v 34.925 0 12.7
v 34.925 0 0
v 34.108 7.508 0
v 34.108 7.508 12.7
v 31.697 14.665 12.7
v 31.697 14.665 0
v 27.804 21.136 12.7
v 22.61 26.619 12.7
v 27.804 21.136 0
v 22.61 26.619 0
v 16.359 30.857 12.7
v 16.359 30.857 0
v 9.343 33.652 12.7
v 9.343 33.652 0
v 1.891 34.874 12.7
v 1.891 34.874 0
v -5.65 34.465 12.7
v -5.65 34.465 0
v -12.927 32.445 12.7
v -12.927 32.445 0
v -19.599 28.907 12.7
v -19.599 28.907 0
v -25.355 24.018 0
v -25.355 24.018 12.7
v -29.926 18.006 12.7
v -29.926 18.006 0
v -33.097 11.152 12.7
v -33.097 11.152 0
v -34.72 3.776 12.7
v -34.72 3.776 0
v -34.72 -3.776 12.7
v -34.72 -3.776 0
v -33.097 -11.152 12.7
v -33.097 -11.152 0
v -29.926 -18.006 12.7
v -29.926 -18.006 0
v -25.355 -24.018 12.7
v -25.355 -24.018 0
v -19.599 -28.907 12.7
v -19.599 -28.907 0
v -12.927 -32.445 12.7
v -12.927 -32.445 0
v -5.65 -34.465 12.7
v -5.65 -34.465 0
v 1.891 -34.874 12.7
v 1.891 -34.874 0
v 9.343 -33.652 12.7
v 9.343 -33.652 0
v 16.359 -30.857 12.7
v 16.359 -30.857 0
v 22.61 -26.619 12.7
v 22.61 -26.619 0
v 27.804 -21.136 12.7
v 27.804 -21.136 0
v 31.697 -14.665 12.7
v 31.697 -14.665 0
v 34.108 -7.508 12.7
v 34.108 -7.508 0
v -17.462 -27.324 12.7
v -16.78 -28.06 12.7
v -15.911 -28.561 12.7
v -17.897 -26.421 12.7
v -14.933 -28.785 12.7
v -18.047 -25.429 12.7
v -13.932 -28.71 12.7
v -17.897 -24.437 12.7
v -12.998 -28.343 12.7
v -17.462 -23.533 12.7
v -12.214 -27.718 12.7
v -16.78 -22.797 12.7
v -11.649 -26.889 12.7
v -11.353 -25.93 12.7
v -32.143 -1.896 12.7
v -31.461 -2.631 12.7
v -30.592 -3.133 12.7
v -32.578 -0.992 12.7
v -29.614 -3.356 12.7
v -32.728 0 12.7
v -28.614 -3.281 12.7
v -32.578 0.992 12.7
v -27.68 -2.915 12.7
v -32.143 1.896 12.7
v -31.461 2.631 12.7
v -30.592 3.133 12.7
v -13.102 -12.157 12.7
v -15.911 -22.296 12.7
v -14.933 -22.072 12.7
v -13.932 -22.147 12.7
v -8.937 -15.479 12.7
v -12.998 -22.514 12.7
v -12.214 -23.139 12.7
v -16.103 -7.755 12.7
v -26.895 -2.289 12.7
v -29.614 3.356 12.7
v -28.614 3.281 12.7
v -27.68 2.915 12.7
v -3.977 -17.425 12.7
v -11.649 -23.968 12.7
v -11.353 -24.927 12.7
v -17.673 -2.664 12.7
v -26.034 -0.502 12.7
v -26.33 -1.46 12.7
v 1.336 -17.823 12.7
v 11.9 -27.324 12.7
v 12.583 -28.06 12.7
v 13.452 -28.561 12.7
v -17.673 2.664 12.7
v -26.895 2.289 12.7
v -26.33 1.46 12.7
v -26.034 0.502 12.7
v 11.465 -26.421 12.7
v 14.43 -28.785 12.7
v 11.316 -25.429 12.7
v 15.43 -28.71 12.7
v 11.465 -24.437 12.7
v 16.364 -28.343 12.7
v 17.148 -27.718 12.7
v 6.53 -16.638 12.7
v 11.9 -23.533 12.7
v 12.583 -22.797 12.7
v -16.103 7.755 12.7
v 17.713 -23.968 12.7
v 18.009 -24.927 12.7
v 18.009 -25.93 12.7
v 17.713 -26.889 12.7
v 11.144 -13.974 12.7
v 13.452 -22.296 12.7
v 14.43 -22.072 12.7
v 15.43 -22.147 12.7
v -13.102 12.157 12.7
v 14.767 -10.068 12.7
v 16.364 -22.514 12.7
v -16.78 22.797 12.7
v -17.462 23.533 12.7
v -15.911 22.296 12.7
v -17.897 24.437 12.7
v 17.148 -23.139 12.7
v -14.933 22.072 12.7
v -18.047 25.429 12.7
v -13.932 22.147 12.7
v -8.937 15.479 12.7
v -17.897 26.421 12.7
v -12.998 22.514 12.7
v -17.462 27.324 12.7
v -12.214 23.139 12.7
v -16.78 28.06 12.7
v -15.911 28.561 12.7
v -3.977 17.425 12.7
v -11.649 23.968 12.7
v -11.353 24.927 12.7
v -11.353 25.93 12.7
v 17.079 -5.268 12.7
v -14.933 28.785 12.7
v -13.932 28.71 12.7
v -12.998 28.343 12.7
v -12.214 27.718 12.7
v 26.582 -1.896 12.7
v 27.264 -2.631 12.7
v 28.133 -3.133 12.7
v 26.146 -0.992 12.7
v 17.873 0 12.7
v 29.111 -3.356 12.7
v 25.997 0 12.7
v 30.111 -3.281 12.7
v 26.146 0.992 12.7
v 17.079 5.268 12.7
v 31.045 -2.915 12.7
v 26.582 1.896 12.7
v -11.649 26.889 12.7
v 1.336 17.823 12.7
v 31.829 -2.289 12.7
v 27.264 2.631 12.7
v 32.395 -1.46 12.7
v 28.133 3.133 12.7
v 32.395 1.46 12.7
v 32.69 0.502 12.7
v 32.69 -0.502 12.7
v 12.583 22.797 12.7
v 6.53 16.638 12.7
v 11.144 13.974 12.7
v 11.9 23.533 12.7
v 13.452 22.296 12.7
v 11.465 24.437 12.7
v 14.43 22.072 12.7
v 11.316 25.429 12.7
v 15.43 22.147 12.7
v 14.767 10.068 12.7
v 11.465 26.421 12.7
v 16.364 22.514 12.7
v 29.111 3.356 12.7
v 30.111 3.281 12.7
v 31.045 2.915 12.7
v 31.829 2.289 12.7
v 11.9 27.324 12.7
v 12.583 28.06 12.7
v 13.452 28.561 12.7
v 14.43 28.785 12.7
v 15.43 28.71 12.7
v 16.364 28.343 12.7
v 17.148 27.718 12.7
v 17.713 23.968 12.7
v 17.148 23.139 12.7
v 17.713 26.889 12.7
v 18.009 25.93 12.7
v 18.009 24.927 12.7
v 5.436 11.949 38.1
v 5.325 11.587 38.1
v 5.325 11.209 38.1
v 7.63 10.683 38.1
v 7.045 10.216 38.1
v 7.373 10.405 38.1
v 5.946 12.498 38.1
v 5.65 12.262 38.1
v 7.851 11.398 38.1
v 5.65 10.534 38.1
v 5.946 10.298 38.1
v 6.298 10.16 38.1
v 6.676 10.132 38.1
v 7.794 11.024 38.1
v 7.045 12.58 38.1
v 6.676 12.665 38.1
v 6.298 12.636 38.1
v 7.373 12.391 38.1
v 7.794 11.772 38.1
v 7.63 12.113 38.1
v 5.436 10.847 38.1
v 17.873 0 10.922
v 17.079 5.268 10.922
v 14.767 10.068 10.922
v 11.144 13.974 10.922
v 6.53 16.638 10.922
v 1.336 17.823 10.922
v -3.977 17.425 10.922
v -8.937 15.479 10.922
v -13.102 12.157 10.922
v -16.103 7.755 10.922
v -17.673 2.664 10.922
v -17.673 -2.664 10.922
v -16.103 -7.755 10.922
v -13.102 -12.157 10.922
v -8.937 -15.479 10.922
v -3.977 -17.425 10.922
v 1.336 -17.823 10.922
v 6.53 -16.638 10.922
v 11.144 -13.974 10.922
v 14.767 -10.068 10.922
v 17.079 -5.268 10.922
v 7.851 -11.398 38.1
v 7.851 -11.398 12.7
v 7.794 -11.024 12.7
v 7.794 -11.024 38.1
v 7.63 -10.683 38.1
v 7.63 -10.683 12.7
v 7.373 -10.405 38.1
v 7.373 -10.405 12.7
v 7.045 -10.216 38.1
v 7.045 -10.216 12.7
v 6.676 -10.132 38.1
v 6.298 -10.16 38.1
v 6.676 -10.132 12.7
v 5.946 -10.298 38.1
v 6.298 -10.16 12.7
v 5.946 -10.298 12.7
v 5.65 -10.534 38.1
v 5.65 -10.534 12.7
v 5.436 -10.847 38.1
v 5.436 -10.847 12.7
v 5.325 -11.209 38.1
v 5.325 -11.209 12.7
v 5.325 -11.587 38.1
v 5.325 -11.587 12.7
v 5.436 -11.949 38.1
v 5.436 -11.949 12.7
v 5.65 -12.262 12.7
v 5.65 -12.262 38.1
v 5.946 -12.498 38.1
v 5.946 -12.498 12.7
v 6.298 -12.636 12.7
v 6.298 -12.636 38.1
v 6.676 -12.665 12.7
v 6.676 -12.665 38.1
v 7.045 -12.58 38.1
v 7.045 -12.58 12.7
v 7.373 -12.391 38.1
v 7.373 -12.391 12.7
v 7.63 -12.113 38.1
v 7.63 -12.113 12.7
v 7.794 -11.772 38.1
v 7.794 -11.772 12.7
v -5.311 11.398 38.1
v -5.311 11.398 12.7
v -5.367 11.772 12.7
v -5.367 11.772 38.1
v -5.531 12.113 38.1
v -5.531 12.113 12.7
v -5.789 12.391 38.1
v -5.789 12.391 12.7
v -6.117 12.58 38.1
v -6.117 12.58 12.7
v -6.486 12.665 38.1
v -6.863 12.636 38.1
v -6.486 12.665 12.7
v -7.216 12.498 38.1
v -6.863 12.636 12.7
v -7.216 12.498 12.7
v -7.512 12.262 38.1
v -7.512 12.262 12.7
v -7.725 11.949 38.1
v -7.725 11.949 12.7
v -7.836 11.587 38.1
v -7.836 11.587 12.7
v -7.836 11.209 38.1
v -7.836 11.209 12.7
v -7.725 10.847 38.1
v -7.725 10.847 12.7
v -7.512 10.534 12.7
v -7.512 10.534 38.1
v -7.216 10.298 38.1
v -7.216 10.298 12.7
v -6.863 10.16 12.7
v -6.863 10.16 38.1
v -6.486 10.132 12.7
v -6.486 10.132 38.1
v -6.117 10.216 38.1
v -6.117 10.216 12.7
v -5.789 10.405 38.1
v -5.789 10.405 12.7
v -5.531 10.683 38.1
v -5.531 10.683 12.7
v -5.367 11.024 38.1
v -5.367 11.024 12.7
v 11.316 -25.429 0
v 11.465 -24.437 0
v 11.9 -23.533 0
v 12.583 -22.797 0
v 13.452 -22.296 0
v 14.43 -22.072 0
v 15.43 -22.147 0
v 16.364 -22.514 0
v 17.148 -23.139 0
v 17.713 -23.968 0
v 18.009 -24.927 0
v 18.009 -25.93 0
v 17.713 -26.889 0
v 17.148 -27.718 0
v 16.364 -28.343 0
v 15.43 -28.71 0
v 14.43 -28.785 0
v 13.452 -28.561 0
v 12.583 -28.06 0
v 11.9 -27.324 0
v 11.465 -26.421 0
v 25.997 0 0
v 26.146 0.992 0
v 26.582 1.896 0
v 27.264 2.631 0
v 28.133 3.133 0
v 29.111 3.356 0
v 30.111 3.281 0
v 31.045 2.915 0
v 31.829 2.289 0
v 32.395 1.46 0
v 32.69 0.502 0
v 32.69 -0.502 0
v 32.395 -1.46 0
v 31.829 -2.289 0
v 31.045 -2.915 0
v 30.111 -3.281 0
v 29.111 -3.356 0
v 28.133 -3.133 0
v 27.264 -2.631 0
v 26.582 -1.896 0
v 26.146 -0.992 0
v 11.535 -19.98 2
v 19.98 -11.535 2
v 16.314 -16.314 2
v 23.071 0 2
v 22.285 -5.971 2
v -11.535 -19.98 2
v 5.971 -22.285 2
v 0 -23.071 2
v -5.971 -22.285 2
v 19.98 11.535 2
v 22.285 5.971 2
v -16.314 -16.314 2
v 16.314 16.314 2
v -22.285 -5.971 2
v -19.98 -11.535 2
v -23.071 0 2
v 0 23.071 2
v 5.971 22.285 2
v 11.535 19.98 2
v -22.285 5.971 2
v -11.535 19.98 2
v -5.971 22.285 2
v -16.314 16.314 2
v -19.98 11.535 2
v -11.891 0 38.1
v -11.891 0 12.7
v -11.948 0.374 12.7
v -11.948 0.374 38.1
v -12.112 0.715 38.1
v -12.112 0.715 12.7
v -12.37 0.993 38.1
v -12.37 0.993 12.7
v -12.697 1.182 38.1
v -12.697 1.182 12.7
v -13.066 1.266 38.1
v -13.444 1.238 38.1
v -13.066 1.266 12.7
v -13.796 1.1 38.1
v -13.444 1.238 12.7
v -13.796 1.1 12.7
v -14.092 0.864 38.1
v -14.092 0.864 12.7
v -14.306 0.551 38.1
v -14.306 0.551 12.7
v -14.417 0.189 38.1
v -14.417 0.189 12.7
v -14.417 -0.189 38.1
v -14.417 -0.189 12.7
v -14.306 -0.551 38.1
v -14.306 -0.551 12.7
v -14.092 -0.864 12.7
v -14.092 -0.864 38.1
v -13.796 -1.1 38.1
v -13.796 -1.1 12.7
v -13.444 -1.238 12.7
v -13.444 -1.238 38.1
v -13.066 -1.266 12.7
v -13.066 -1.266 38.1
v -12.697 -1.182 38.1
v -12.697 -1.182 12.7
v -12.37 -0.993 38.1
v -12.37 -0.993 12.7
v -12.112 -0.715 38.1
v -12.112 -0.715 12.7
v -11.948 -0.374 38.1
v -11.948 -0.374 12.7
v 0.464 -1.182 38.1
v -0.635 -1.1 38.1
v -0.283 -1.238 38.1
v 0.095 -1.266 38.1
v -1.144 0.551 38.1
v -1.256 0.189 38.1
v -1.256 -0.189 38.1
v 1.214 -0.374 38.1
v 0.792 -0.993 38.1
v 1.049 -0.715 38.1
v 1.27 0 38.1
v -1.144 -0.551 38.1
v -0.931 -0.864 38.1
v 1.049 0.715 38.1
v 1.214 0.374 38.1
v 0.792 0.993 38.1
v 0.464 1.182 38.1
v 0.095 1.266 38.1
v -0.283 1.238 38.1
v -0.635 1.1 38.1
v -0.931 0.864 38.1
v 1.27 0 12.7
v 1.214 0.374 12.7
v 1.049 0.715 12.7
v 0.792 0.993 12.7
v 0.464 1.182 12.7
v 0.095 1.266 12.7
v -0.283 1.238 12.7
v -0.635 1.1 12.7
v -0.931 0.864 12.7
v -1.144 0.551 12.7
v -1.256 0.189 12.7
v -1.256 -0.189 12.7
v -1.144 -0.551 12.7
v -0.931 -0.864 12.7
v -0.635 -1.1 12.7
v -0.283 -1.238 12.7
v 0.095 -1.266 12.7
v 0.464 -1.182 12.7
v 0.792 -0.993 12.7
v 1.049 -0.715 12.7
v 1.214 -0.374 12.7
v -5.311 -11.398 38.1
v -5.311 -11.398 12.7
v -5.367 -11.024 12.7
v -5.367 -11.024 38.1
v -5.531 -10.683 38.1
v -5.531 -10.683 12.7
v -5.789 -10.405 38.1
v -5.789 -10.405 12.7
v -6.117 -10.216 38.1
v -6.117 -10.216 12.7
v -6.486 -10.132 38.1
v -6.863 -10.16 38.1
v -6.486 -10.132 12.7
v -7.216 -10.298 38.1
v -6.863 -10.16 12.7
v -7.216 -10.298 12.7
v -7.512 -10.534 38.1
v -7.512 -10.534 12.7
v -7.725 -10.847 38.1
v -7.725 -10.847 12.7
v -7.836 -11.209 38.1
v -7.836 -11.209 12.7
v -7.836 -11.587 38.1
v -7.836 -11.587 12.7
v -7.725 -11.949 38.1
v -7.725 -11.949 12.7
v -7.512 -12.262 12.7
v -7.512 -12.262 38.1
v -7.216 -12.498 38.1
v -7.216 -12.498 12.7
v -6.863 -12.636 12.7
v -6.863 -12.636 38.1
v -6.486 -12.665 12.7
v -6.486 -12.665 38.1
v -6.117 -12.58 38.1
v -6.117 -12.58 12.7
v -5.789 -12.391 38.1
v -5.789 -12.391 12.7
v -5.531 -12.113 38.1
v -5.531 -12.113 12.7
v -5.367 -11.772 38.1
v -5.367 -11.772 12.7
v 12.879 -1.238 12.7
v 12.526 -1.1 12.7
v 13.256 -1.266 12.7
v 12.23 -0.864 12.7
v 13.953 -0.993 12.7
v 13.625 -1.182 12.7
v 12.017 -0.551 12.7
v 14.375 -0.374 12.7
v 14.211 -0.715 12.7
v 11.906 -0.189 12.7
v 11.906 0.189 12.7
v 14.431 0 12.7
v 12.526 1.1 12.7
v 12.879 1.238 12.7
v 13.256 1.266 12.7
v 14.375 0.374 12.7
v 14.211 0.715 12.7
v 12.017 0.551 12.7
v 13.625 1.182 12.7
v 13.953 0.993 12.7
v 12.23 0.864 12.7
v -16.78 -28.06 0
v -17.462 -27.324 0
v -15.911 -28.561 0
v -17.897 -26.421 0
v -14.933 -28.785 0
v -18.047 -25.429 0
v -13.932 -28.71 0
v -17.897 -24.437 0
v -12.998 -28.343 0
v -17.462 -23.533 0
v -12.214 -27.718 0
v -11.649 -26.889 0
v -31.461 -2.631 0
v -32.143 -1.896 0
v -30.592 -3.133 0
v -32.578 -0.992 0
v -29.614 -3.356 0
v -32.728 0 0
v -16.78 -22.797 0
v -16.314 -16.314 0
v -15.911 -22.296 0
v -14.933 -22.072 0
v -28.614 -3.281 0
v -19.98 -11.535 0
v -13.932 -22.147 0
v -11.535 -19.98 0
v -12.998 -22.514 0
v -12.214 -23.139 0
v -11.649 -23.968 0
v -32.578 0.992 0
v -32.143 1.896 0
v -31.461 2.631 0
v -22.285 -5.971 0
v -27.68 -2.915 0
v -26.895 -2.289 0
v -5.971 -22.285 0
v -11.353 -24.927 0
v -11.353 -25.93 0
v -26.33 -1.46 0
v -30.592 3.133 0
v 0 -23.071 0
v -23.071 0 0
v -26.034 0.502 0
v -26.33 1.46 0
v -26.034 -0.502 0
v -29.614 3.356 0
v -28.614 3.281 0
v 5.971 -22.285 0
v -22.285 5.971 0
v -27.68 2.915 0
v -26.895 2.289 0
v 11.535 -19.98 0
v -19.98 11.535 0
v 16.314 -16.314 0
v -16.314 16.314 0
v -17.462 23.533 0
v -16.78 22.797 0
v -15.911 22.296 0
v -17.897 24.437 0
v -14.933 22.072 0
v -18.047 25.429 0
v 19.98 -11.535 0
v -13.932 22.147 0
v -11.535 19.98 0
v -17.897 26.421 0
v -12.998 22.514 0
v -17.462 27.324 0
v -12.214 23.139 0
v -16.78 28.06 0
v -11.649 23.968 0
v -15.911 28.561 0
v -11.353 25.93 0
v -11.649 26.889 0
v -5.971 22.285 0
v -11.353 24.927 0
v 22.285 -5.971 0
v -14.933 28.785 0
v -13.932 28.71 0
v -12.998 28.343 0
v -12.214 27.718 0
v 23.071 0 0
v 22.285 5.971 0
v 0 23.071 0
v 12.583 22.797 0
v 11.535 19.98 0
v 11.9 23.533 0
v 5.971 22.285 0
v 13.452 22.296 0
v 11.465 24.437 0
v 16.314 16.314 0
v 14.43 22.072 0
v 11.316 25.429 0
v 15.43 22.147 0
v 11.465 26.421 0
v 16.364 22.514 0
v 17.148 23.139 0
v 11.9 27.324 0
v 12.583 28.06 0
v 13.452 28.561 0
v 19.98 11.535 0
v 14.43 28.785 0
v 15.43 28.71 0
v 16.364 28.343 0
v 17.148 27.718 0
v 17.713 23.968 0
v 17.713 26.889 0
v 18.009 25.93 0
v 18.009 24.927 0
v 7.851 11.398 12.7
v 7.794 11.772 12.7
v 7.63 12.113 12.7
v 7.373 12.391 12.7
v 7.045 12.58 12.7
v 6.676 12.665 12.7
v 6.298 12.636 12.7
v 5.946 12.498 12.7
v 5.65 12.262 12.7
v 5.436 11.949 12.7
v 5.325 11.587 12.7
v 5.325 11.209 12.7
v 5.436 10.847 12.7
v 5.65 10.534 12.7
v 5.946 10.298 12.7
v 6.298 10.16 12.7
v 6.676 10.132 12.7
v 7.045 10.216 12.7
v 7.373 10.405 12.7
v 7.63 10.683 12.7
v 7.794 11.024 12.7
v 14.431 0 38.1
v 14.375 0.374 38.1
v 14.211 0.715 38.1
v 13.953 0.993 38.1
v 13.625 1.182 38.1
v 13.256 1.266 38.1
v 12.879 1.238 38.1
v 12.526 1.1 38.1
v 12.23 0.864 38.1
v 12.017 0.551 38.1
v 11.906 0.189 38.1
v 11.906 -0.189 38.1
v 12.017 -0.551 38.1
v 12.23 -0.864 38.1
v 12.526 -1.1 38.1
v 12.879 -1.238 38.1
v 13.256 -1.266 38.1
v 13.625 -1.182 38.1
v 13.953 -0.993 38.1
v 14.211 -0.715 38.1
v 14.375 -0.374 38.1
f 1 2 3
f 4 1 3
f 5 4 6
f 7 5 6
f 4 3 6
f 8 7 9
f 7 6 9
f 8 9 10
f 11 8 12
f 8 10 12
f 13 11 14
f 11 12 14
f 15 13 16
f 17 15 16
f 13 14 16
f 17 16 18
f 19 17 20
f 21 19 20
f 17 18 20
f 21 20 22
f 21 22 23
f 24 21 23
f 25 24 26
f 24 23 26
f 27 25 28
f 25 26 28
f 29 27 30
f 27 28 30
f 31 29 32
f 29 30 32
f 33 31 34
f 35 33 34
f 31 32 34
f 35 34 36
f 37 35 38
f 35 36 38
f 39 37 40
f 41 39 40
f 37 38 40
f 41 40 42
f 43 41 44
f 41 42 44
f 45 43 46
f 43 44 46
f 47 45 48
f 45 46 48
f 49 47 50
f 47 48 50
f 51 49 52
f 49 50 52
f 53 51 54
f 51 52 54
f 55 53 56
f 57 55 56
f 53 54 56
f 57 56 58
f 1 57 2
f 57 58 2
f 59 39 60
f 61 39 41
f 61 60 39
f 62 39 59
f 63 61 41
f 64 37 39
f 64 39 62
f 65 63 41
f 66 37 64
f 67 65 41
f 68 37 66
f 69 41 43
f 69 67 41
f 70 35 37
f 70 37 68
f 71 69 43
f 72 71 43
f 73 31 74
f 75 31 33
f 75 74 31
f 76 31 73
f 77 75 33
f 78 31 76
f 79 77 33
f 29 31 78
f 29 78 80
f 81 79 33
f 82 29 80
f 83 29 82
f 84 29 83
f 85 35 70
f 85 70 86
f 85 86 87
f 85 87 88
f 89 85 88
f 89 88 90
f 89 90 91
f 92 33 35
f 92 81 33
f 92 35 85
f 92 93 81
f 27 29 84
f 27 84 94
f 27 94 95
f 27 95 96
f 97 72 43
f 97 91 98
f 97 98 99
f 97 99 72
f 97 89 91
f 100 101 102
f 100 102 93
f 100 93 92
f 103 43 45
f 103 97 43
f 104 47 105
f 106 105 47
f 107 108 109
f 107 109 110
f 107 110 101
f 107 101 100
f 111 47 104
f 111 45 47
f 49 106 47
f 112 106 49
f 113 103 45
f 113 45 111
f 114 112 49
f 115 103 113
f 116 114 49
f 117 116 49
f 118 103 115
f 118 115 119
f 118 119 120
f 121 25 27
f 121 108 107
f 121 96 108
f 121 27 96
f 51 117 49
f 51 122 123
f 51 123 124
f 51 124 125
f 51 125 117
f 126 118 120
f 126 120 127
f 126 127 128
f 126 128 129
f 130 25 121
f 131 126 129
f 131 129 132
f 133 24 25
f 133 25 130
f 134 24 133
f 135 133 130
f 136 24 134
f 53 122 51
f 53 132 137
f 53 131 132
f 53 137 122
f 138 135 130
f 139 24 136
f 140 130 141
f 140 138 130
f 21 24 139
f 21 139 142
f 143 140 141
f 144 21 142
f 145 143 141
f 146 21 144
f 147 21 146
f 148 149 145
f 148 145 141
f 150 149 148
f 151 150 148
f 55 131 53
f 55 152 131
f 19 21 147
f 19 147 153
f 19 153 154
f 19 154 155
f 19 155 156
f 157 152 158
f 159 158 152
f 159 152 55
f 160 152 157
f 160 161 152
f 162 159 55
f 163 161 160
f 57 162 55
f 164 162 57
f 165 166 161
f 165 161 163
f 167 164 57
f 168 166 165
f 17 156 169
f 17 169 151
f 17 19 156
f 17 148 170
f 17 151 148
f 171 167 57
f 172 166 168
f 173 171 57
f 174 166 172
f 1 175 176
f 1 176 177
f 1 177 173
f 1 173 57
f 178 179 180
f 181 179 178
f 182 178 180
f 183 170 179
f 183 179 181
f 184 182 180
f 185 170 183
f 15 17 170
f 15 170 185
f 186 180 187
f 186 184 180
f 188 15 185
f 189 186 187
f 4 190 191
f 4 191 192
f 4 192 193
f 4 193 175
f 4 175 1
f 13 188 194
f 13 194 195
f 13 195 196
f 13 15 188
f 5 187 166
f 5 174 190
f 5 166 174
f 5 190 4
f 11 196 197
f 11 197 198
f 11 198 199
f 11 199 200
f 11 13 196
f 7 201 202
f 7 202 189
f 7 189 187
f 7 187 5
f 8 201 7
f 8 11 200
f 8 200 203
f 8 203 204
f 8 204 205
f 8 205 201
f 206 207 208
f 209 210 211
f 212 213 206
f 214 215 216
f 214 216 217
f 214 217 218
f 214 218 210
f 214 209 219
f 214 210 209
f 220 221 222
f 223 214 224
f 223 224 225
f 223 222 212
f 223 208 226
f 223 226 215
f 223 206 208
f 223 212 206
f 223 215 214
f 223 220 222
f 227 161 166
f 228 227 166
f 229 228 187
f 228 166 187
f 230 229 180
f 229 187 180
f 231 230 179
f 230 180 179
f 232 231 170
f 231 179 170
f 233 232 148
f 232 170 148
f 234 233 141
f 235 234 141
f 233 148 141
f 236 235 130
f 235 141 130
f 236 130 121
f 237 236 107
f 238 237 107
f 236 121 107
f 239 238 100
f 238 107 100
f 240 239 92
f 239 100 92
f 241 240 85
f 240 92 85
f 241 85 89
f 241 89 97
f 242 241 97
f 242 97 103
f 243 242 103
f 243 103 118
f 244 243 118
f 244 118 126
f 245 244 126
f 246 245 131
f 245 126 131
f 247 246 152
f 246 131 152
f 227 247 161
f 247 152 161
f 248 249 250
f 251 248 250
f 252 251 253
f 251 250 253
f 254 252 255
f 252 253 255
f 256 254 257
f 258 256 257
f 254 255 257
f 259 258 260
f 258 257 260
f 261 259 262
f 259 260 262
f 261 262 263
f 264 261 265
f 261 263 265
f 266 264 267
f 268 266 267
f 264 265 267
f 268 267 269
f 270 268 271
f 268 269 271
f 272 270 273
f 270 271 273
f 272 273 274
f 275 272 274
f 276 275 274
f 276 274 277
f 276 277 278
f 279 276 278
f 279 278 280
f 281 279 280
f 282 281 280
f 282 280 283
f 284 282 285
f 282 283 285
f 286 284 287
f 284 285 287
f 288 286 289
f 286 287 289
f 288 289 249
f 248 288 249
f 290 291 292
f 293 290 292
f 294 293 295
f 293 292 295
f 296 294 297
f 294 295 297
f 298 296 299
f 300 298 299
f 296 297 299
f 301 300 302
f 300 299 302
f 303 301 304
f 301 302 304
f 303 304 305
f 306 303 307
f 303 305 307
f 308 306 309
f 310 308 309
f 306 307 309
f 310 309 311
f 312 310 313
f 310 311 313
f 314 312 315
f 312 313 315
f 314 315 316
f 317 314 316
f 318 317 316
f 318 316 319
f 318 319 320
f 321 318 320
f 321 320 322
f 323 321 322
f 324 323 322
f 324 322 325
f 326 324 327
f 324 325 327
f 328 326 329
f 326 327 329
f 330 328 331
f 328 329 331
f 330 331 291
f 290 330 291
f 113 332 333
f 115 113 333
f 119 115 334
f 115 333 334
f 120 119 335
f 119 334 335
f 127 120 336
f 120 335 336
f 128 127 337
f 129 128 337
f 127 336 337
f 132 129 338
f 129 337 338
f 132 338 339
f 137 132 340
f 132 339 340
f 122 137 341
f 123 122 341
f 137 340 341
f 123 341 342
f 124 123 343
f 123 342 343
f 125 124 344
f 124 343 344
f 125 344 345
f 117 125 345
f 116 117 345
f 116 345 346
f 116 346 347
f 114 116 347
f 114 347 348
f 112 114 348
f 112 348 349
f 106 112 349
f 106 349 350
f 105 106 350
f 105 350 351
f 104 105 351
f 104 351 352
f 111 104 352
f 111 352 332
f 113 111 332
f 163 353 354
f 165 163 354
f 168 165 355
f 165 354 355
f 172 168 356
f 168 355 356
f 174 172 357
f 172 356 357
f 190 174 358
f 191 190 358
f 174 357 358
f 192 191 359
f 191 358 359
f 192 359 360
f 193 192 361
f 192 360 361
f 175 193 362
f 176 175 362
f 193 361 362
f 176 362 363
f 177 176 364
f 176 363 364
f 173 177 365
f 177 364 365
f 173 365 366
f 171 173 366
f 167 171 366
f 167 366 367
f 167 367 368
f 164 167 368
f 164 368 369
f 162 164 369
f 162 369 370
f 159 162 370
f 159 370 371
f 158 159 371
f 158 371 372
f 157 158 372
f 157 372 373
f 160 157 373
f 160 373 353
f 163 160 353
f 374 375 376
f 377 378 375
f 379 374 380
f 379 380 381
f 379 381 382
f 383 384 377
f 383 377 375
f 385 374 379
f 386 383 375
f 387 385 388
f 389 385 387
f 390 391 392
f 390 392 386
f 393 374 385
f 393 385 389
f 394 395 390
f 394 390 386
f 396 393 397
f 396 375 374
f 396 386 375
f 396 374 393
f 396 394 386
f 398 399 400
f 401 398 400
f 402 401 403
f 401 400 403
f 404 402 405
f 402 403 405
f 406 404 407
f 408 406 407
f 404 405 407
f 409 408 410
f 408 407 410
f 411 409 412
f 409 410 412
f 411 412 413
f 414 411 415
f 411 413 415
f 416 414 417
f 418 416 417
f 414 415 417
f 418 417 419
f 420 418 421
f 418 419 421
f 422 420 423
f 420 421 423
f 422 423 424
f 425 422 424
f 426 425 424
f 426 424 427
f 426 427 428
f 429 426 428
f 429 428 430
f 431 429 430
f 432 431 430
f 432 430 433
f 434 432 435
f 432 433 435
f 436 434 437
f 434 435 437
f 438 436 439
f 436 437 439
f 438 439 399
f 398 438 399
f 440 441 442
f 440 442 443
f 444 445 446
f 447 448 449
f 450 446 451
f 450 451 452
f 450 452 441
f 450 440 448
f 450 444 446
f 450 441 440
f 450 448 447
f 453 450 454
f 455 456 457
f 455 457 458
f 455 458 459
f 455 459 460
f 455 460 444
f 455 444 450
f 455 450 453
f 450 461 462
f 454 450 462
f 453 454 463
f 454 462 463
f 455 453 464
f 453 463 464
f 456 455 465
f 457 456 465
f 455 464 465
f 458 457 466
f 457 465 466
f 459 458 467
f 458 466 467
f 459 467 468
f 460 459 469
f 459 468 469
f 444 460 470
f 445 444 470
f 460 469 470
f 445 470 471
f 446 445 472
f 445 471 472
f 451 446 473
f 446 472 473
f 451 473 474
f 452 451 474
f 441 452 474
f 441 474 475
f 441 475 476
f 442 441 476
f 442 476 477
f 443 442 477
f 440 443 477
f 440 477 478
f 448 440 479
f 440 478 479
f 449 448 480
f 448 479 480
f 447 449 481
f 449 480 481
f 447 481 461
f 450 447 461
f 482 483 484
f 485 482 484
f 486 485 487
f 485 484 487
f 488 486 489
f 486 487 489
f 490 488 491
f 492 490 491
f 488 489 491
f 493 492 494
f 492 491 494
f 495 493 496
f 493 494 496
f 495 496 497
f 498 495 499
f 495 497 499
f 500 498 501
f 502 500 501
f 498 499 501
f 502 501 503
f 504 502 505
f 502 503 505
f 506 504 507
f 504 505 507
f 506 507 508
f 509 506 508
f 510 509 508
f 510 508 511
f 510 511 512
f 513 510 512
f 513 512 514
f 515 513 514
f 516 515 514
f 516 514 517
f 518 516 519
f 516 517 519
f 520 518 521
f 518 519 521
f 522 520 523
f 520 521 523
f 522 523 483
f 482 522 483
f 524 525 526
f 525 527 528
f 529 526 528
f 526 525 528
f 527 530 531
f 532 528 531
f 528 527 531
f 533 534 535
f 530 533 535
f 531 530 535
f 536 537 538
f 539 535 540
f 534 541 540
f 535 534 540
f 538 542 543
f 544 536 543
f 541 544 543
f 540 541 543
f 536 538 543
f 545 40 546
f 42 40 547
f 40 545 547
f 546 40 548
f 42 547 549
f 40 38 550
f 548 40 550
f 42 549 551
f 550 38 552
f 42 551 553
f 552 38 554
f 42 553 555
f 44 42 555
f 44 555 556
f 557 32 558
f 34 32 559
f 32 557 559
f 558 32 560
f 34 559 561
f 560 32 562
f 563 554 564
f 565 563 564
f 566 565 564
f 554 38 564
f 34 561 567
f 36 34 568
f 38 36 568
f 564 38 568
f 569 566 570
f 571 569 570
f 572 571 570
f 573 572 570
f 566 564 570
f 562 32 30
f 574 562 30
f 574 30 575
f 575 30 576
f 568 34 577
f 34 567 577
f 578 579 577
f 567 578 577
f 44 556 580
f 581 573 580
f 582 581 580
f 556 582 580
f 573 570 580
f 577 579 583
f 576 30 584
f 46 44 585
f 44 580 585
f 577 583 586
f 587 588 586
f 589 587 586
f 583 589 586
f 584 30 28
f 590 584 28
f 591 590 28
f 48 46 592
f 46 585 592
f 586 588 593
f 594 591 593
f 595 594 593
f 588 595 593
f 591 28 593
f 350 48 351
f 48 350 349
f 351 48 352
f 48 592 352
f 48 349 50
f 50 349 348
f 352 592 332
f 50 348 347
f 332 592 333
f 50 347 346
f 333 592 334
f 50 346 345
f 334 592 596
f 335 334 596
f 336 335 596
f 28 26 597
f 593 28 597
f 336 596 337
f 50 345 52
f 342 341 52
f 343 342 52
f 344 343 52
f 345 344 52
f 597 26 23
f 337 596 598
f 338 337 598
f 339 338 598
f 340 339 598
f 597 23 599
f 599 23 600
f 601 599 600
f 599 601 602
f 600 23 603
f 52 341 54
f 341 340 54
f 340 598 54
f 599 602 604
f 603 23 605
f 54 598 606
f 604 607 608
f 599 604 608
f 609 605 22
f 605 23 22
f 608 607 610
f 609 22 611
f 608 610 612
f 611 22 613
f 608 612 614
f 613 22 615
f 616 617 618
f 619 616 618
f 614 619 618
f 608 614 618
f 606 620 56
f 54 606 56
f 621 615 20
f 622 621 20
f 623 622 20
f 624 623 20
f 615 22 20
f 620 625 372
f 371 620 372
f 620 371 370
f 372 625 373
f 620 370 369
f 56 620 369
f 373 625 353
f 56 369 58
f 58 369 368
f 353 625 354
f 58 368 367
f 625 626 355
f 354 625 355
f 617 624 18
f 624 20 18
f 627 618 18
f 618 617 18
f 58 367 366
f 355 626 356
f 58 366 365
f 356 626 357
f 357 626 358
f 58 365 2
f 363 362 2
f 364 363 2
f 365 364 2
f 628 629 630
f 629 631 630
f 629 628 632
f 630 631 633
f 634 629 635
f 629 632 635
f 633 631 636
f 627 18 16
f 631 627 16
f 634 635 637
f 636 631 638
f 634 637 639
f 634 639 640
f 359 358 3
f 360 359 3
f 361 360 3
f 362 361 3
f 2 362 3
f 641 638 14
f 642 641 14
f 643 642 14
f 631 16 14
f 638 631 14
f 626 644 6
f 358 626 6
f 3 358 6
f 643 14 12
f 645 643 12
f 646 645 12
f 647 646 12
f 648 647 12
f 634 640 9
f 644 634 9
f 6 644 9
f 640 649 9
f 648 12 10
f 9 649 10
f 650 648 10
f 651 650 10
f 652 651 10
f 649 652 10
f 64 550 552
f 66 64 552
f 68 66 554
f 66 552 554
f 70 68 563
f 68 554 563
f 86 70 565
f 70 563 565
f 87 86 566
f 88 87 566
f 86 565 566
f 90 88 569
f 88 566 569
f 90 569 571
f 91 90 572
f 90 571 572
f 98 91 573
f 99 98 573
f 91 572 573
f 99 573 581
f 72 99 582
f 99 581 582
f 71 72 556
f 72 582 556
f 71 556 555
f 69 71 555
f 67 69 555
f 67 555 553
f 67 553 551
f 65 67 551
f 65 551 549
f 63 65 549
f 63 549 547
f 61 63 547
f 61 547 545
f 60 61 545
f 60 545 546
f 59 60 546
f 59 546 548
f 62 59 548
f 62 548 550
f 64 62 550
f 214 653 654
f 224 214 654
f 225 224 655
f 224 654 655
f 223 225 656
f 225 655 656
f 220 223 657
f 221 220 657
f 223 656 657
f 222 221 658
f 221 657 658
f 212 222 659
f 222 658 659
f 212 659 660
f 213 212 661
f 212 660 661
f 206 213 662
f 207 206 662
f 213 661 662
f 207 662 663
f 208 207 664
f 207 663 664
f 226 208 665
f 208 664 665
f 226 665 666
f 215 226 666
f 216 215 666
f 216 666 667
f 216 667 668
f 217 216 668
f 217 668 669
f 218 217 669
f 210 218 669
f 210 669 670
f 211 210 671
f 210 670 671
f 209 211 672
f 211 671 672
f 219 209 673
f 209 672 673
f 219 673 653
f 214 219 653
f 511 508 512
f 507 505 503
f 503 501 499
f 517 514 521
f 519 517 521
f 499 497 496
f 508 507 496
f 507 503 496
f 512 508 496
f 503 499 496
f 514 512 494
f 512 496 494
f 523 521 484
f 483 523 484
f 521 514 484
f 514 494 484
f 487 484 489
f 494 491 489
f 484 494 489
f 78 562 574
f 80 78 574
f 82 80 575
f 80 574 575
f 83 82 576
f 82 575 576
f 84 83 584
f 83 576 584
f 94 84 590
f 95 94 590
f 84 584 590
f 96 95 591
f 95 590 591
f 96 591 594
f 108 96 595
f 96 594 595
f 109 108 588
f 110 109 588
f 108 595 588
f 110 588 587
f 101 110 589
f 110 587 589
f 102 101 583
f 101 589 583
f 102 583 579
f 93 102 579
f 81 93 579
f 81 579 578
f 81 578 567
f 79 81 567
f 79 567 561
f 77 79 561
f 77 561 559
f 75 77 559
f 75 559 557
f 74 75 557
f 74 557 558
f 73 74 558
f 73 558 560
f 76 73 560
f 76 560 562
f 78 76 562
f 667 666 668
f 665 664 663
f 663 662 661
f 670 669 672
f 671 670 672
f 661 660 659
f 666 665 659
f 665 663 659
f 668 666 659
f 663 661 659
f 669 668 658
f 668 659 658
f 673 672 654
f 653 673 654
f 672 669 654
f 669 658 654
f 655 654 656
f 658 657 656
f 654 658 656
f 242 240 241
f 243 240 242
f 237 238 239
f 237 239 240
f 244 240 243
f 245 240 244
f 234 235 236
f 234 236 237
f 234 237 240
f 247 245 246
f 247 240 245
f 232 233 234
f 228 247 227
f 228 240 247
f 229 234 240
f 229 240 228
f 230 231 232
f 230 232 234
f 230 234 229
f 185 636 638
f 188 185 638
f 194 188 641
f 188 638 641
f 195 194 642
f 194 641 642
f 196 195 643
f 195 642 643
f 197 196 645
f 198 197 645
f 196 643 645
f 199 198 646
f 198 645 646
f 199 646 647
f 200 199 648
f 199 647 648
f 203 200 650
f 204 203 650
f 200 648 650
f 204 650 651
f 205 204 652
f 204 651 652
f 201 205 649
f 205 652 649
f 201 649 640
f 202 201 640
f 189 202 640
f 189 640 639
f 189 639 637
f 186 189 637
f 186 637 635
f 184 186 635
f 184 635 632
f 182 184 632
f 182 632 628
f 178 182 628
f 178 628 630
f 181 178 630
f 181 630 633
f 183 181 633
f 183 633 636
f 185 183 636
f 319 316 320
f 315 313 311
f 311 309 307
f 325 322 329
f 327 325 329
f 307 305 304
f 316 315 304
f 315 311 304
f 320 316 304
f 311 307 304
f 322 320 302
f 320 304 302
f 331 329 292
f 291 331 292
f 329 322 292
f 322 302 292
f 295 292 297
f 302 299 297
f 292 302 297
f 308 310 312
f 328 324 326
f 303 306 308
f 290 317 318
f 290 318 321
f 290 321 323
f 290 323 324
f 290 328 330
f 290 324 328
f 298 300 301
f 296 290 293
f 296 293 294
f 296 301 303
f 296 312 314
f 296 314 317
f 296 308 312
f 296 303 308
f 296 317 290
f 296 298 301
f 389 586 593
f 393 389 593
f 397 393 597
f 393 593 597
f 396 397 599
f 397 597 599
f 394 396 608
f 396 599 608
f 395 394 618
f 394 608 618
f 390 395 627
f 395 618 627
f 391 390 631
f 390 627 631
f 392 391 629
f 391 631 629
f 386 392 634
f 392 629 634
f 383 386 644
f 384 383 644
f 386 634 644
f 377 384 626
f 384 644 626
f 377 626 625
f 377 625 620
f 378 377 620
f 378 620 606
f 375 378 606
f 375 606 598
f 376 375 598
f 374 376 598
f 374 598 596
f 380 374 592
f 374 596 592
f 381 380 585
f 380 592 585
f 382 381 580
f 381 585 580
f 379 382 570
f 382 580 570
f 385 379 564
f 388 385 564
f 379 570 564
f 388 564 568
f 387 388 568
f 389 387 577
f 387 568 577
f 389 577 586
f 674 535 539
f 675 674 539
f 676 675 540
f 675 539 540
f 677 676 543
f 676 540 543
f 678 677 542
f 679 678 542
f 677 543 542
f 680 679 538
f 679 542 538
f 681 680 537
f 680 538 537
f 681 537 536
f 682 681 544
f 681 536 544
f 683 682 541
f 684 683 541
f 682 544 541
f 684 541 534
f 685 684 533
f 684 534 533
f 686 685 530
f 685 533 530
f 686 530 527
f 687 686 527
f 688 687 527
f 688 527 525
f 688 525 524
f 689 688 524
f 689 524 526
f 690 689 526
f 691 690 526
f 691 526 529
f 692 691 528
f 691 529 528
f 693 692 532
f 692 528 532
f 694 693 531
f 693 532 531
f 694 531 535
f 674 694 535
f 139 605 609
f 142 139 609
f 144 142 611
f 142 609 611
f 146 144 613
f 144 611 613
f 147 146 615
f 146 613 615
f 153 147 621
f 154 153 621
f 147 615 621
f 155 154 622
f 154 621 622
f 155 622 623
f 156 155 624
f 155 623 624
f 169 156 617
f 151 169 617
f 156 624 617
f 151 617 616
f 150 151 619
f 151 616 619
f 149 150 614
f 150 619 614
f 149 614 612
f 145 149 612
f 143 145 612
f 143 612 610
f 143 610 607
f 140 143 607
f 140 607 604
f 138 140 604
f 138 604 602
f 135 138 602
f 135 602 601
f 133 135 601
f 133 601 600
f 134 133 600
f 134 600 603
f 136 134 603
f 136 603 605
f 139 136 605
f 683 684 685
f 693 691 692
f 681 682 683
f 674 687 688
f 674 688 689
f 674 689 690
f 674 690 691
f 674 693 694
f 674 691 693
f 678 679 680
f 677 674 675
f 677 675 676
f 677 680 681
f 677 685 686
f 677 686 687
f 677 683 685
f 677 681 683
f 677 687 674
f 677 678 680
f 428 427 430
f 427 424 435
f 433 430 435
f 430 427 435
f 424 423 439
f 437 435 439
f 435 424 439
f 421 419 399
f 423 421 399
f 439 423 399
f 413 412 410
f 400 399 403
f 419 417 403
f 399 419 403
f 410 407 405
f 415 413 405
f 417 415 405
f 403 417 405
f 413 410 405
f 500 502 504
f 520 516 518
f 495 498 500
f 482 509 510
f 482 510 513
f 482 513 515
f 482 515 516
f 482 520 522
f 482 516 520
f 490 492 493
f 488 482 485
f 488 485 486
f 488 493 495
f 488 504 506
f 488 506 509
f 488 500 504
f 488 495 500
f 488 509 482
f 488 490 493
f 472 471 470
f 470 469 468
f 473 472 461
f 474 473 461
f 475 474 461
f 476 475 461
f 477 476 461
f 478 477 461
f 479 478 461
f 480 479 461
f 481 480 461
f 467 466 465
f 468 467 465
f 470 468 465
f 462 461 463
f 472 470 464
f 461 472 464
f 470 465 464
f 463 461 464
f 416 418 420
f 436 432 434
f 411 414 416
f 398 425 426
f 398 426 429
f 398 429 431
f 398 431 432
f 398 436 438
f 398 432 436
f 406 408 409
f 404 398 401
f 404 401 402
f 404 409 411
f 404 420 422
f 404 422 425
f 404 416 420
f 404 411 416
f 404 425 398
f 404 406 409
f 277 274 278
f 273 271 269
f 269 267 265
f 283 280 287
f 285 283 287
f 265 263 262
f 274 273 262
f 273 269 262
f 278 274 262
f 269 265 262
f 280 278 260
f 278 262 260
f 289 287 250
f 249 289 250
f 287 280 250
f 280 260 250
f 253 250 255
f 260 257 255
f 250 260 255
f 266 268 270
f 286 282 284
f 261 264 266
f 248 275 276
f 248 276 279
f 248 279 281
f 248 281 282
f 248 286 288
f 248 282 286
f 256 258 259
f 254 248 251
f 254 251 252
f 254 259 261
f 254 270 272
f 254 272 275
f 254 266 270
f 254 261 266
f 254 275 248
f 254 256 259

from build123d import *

# Parameters (mm, degrees)
SKETCH1_R          = 34.925
EXTRUDE1_DEPTH     = 12.7
SKETCH2_R          = 23.07082
CUT_EXTRUDE1_DEPTH = 1.999996
SKETCH3_R          = 1.27
EXTRUDE4_DEPTH     = 25.4
SKETCH4_R          = 17.873116296
CUT_EXTRUDE2_DEPTH = 1.778
SKETCH6_R          = 3.3655
CUT_EXTRUDE3_DEPTH = 63.378852586


with BuildPart() as part:
    # Sketch1 → Extrude1 (new body)
    with BuildSketch(Plane.XY):
        Circle(SKETCH1_R)
    extrude(amount=EXTRUDE1_DEPTH)

    # Sketch2 → Cut-Extrude1 (cut)
    with BuildSketch(Plane(origin=(0, 0, 0), x_dir=(-1, 0, 0), z_dir=(0, 0, -1))):
        Circle(SKETCH2_R)
    extrude(amount=-CUT_EXTRUDE1_DEPTH, mode=Mode.SUBTRACT)

    # Sketch3 → Extrude4 (add)
    with BuildSketch(Plane.XY.offset(12.7)):
        Circle(SKETCH3_R)
        with Locations((-6.580668236, 11.398051733)):
            Circle(SKETCH3_R)
        with Locations((6.580668236, 11.398051733)):
            Circle(SKETCH3_R)
        with Locations((13.161336472, 0)):
            Circle(SKETCH3_R)
        with Locations((6.580668236, -11.398051733)):
            Circle(SKETCH3_R)
        with Locations((-6.580668236, -11.398051733)):
            Circle(SKETCH3_R)
        with Locations((-13.161336472, 0)):
            Circle(SKETCH3_R)
    extrude(amount=EXTRUDE4_DEPTH)

    # Sketch4 → Cut-Extrude2 (cut)
    with BuildSketch(Plane.XY.offset(12.7)):
        Circle(SKETCH4_R)
    extrude(amount=-CUT_EXTRUDE2_DEPTH, mode=Mode.SUBTRACT)


with BuildPart() as cut_extrude2_piece_1:
    # of the separate pieces the step leaves, piece 1, a body of its own (cut_extrude2_pieces)
    add(part.part.solids().sort_by_distance((34.925, 0, 0))[0])

    # Sketch6 → Cut-Extrude3 (cut, through all)
    with BuildSketch(Plane(origin=(0, 0, 0), x_dir=(-1, 0, 0), z_dir=(0, 0, -1))):
        with Locations((-14.6812, 25.428584316)):
            Circle(SKETCH6_R)
        with Locations((14.6812, 25.428584316)):
            Circle(SKETCH6_R)
        with Locations((29.3624, 0)):
            Circle(SKETCH6_R)
        with Locations((14.6812, -25.428584316)):
            Circle(SKETCH6_R)
        with Locations((-14.6812, -25.428584316)):
            Circle(SKETCH6_R)
        with Locations((-29.3624, 0)):
            Circle(SKETCH6_R)
    extrude(amount=-CUT_EXTRUDE3_DEPTH, mode=Mode.SUBTRACT)


with BuildPart() as cut_extrude2_piece_2:
    # of the separate pieces the step leaves, piece 2, a body of its own (cut_extrude2_pieces)
    add(part.part.solids().sort_by_distance((-11.891336472, 0, 12.7))[0])


with BuildPart() as cut_extrude2_piece_3:
    # of the separate pieces the step leaves, piece 3, a body of its own (cut_extrude2_pieces)
    add(part.part.solids().sort_by_distance((14.431336472, 0, 12.7))[0])


with BuildPart() as cut_extrude2_piece_4:
    # of the separate pieces the step leaves, piece 4, a body of its own (cut_extrude2_pieces)
    add(part.part.solids().sort_by_distance((-5.310668236, -11.398051733, 12.7))[0])


with BuildPart() as cut_extrude2_piece_5:
    # of the separate pieces the step leaves, piece 5, a body of its own (cut_extrude2_pieces)
    add(part.part.solids().sort_by_distance((-5.310668236, 11.398051733, 12.7))[0])


with BuildPart() as cut_extrude2_piece_6:
    # of the separate pieces the step leaves, piece 6, a body of its own (cut_extrude2_pieces)
    add(part.part.solids().sort_by_distance((7.850668236, 11.398051733, 12.7))[0])


with BuildPart() as cut_extrude2_piece_7:
    # of the separate pieces the step leaves, piece 7, a body of its own (cut_extrude2_pieces)
    add(part.part.solids().sort_by_distance((1.27, 0, 12.7))[0])


with BuildPart() as cut_extrude2_piece_8:
    # of the separate pieces the step leaves, piece 8, a body of its own (cut_extrude2_pieces)
    add(part.part.solids().sort_by_distance((7.850668236, -11.398051733, 12.7))[0])


solid = Compound([cut_extrude2_piece_1.part, cut_extrude2_piece_2.part, cut_extrude2_piece_3.part, cut_extrude2_piece_4.part, cut_extrude2_piece_5.part, cut_extrude2_piece_6.part, cut_extrude2_piece_7.part, cut_extrude2_piece_8.part])
